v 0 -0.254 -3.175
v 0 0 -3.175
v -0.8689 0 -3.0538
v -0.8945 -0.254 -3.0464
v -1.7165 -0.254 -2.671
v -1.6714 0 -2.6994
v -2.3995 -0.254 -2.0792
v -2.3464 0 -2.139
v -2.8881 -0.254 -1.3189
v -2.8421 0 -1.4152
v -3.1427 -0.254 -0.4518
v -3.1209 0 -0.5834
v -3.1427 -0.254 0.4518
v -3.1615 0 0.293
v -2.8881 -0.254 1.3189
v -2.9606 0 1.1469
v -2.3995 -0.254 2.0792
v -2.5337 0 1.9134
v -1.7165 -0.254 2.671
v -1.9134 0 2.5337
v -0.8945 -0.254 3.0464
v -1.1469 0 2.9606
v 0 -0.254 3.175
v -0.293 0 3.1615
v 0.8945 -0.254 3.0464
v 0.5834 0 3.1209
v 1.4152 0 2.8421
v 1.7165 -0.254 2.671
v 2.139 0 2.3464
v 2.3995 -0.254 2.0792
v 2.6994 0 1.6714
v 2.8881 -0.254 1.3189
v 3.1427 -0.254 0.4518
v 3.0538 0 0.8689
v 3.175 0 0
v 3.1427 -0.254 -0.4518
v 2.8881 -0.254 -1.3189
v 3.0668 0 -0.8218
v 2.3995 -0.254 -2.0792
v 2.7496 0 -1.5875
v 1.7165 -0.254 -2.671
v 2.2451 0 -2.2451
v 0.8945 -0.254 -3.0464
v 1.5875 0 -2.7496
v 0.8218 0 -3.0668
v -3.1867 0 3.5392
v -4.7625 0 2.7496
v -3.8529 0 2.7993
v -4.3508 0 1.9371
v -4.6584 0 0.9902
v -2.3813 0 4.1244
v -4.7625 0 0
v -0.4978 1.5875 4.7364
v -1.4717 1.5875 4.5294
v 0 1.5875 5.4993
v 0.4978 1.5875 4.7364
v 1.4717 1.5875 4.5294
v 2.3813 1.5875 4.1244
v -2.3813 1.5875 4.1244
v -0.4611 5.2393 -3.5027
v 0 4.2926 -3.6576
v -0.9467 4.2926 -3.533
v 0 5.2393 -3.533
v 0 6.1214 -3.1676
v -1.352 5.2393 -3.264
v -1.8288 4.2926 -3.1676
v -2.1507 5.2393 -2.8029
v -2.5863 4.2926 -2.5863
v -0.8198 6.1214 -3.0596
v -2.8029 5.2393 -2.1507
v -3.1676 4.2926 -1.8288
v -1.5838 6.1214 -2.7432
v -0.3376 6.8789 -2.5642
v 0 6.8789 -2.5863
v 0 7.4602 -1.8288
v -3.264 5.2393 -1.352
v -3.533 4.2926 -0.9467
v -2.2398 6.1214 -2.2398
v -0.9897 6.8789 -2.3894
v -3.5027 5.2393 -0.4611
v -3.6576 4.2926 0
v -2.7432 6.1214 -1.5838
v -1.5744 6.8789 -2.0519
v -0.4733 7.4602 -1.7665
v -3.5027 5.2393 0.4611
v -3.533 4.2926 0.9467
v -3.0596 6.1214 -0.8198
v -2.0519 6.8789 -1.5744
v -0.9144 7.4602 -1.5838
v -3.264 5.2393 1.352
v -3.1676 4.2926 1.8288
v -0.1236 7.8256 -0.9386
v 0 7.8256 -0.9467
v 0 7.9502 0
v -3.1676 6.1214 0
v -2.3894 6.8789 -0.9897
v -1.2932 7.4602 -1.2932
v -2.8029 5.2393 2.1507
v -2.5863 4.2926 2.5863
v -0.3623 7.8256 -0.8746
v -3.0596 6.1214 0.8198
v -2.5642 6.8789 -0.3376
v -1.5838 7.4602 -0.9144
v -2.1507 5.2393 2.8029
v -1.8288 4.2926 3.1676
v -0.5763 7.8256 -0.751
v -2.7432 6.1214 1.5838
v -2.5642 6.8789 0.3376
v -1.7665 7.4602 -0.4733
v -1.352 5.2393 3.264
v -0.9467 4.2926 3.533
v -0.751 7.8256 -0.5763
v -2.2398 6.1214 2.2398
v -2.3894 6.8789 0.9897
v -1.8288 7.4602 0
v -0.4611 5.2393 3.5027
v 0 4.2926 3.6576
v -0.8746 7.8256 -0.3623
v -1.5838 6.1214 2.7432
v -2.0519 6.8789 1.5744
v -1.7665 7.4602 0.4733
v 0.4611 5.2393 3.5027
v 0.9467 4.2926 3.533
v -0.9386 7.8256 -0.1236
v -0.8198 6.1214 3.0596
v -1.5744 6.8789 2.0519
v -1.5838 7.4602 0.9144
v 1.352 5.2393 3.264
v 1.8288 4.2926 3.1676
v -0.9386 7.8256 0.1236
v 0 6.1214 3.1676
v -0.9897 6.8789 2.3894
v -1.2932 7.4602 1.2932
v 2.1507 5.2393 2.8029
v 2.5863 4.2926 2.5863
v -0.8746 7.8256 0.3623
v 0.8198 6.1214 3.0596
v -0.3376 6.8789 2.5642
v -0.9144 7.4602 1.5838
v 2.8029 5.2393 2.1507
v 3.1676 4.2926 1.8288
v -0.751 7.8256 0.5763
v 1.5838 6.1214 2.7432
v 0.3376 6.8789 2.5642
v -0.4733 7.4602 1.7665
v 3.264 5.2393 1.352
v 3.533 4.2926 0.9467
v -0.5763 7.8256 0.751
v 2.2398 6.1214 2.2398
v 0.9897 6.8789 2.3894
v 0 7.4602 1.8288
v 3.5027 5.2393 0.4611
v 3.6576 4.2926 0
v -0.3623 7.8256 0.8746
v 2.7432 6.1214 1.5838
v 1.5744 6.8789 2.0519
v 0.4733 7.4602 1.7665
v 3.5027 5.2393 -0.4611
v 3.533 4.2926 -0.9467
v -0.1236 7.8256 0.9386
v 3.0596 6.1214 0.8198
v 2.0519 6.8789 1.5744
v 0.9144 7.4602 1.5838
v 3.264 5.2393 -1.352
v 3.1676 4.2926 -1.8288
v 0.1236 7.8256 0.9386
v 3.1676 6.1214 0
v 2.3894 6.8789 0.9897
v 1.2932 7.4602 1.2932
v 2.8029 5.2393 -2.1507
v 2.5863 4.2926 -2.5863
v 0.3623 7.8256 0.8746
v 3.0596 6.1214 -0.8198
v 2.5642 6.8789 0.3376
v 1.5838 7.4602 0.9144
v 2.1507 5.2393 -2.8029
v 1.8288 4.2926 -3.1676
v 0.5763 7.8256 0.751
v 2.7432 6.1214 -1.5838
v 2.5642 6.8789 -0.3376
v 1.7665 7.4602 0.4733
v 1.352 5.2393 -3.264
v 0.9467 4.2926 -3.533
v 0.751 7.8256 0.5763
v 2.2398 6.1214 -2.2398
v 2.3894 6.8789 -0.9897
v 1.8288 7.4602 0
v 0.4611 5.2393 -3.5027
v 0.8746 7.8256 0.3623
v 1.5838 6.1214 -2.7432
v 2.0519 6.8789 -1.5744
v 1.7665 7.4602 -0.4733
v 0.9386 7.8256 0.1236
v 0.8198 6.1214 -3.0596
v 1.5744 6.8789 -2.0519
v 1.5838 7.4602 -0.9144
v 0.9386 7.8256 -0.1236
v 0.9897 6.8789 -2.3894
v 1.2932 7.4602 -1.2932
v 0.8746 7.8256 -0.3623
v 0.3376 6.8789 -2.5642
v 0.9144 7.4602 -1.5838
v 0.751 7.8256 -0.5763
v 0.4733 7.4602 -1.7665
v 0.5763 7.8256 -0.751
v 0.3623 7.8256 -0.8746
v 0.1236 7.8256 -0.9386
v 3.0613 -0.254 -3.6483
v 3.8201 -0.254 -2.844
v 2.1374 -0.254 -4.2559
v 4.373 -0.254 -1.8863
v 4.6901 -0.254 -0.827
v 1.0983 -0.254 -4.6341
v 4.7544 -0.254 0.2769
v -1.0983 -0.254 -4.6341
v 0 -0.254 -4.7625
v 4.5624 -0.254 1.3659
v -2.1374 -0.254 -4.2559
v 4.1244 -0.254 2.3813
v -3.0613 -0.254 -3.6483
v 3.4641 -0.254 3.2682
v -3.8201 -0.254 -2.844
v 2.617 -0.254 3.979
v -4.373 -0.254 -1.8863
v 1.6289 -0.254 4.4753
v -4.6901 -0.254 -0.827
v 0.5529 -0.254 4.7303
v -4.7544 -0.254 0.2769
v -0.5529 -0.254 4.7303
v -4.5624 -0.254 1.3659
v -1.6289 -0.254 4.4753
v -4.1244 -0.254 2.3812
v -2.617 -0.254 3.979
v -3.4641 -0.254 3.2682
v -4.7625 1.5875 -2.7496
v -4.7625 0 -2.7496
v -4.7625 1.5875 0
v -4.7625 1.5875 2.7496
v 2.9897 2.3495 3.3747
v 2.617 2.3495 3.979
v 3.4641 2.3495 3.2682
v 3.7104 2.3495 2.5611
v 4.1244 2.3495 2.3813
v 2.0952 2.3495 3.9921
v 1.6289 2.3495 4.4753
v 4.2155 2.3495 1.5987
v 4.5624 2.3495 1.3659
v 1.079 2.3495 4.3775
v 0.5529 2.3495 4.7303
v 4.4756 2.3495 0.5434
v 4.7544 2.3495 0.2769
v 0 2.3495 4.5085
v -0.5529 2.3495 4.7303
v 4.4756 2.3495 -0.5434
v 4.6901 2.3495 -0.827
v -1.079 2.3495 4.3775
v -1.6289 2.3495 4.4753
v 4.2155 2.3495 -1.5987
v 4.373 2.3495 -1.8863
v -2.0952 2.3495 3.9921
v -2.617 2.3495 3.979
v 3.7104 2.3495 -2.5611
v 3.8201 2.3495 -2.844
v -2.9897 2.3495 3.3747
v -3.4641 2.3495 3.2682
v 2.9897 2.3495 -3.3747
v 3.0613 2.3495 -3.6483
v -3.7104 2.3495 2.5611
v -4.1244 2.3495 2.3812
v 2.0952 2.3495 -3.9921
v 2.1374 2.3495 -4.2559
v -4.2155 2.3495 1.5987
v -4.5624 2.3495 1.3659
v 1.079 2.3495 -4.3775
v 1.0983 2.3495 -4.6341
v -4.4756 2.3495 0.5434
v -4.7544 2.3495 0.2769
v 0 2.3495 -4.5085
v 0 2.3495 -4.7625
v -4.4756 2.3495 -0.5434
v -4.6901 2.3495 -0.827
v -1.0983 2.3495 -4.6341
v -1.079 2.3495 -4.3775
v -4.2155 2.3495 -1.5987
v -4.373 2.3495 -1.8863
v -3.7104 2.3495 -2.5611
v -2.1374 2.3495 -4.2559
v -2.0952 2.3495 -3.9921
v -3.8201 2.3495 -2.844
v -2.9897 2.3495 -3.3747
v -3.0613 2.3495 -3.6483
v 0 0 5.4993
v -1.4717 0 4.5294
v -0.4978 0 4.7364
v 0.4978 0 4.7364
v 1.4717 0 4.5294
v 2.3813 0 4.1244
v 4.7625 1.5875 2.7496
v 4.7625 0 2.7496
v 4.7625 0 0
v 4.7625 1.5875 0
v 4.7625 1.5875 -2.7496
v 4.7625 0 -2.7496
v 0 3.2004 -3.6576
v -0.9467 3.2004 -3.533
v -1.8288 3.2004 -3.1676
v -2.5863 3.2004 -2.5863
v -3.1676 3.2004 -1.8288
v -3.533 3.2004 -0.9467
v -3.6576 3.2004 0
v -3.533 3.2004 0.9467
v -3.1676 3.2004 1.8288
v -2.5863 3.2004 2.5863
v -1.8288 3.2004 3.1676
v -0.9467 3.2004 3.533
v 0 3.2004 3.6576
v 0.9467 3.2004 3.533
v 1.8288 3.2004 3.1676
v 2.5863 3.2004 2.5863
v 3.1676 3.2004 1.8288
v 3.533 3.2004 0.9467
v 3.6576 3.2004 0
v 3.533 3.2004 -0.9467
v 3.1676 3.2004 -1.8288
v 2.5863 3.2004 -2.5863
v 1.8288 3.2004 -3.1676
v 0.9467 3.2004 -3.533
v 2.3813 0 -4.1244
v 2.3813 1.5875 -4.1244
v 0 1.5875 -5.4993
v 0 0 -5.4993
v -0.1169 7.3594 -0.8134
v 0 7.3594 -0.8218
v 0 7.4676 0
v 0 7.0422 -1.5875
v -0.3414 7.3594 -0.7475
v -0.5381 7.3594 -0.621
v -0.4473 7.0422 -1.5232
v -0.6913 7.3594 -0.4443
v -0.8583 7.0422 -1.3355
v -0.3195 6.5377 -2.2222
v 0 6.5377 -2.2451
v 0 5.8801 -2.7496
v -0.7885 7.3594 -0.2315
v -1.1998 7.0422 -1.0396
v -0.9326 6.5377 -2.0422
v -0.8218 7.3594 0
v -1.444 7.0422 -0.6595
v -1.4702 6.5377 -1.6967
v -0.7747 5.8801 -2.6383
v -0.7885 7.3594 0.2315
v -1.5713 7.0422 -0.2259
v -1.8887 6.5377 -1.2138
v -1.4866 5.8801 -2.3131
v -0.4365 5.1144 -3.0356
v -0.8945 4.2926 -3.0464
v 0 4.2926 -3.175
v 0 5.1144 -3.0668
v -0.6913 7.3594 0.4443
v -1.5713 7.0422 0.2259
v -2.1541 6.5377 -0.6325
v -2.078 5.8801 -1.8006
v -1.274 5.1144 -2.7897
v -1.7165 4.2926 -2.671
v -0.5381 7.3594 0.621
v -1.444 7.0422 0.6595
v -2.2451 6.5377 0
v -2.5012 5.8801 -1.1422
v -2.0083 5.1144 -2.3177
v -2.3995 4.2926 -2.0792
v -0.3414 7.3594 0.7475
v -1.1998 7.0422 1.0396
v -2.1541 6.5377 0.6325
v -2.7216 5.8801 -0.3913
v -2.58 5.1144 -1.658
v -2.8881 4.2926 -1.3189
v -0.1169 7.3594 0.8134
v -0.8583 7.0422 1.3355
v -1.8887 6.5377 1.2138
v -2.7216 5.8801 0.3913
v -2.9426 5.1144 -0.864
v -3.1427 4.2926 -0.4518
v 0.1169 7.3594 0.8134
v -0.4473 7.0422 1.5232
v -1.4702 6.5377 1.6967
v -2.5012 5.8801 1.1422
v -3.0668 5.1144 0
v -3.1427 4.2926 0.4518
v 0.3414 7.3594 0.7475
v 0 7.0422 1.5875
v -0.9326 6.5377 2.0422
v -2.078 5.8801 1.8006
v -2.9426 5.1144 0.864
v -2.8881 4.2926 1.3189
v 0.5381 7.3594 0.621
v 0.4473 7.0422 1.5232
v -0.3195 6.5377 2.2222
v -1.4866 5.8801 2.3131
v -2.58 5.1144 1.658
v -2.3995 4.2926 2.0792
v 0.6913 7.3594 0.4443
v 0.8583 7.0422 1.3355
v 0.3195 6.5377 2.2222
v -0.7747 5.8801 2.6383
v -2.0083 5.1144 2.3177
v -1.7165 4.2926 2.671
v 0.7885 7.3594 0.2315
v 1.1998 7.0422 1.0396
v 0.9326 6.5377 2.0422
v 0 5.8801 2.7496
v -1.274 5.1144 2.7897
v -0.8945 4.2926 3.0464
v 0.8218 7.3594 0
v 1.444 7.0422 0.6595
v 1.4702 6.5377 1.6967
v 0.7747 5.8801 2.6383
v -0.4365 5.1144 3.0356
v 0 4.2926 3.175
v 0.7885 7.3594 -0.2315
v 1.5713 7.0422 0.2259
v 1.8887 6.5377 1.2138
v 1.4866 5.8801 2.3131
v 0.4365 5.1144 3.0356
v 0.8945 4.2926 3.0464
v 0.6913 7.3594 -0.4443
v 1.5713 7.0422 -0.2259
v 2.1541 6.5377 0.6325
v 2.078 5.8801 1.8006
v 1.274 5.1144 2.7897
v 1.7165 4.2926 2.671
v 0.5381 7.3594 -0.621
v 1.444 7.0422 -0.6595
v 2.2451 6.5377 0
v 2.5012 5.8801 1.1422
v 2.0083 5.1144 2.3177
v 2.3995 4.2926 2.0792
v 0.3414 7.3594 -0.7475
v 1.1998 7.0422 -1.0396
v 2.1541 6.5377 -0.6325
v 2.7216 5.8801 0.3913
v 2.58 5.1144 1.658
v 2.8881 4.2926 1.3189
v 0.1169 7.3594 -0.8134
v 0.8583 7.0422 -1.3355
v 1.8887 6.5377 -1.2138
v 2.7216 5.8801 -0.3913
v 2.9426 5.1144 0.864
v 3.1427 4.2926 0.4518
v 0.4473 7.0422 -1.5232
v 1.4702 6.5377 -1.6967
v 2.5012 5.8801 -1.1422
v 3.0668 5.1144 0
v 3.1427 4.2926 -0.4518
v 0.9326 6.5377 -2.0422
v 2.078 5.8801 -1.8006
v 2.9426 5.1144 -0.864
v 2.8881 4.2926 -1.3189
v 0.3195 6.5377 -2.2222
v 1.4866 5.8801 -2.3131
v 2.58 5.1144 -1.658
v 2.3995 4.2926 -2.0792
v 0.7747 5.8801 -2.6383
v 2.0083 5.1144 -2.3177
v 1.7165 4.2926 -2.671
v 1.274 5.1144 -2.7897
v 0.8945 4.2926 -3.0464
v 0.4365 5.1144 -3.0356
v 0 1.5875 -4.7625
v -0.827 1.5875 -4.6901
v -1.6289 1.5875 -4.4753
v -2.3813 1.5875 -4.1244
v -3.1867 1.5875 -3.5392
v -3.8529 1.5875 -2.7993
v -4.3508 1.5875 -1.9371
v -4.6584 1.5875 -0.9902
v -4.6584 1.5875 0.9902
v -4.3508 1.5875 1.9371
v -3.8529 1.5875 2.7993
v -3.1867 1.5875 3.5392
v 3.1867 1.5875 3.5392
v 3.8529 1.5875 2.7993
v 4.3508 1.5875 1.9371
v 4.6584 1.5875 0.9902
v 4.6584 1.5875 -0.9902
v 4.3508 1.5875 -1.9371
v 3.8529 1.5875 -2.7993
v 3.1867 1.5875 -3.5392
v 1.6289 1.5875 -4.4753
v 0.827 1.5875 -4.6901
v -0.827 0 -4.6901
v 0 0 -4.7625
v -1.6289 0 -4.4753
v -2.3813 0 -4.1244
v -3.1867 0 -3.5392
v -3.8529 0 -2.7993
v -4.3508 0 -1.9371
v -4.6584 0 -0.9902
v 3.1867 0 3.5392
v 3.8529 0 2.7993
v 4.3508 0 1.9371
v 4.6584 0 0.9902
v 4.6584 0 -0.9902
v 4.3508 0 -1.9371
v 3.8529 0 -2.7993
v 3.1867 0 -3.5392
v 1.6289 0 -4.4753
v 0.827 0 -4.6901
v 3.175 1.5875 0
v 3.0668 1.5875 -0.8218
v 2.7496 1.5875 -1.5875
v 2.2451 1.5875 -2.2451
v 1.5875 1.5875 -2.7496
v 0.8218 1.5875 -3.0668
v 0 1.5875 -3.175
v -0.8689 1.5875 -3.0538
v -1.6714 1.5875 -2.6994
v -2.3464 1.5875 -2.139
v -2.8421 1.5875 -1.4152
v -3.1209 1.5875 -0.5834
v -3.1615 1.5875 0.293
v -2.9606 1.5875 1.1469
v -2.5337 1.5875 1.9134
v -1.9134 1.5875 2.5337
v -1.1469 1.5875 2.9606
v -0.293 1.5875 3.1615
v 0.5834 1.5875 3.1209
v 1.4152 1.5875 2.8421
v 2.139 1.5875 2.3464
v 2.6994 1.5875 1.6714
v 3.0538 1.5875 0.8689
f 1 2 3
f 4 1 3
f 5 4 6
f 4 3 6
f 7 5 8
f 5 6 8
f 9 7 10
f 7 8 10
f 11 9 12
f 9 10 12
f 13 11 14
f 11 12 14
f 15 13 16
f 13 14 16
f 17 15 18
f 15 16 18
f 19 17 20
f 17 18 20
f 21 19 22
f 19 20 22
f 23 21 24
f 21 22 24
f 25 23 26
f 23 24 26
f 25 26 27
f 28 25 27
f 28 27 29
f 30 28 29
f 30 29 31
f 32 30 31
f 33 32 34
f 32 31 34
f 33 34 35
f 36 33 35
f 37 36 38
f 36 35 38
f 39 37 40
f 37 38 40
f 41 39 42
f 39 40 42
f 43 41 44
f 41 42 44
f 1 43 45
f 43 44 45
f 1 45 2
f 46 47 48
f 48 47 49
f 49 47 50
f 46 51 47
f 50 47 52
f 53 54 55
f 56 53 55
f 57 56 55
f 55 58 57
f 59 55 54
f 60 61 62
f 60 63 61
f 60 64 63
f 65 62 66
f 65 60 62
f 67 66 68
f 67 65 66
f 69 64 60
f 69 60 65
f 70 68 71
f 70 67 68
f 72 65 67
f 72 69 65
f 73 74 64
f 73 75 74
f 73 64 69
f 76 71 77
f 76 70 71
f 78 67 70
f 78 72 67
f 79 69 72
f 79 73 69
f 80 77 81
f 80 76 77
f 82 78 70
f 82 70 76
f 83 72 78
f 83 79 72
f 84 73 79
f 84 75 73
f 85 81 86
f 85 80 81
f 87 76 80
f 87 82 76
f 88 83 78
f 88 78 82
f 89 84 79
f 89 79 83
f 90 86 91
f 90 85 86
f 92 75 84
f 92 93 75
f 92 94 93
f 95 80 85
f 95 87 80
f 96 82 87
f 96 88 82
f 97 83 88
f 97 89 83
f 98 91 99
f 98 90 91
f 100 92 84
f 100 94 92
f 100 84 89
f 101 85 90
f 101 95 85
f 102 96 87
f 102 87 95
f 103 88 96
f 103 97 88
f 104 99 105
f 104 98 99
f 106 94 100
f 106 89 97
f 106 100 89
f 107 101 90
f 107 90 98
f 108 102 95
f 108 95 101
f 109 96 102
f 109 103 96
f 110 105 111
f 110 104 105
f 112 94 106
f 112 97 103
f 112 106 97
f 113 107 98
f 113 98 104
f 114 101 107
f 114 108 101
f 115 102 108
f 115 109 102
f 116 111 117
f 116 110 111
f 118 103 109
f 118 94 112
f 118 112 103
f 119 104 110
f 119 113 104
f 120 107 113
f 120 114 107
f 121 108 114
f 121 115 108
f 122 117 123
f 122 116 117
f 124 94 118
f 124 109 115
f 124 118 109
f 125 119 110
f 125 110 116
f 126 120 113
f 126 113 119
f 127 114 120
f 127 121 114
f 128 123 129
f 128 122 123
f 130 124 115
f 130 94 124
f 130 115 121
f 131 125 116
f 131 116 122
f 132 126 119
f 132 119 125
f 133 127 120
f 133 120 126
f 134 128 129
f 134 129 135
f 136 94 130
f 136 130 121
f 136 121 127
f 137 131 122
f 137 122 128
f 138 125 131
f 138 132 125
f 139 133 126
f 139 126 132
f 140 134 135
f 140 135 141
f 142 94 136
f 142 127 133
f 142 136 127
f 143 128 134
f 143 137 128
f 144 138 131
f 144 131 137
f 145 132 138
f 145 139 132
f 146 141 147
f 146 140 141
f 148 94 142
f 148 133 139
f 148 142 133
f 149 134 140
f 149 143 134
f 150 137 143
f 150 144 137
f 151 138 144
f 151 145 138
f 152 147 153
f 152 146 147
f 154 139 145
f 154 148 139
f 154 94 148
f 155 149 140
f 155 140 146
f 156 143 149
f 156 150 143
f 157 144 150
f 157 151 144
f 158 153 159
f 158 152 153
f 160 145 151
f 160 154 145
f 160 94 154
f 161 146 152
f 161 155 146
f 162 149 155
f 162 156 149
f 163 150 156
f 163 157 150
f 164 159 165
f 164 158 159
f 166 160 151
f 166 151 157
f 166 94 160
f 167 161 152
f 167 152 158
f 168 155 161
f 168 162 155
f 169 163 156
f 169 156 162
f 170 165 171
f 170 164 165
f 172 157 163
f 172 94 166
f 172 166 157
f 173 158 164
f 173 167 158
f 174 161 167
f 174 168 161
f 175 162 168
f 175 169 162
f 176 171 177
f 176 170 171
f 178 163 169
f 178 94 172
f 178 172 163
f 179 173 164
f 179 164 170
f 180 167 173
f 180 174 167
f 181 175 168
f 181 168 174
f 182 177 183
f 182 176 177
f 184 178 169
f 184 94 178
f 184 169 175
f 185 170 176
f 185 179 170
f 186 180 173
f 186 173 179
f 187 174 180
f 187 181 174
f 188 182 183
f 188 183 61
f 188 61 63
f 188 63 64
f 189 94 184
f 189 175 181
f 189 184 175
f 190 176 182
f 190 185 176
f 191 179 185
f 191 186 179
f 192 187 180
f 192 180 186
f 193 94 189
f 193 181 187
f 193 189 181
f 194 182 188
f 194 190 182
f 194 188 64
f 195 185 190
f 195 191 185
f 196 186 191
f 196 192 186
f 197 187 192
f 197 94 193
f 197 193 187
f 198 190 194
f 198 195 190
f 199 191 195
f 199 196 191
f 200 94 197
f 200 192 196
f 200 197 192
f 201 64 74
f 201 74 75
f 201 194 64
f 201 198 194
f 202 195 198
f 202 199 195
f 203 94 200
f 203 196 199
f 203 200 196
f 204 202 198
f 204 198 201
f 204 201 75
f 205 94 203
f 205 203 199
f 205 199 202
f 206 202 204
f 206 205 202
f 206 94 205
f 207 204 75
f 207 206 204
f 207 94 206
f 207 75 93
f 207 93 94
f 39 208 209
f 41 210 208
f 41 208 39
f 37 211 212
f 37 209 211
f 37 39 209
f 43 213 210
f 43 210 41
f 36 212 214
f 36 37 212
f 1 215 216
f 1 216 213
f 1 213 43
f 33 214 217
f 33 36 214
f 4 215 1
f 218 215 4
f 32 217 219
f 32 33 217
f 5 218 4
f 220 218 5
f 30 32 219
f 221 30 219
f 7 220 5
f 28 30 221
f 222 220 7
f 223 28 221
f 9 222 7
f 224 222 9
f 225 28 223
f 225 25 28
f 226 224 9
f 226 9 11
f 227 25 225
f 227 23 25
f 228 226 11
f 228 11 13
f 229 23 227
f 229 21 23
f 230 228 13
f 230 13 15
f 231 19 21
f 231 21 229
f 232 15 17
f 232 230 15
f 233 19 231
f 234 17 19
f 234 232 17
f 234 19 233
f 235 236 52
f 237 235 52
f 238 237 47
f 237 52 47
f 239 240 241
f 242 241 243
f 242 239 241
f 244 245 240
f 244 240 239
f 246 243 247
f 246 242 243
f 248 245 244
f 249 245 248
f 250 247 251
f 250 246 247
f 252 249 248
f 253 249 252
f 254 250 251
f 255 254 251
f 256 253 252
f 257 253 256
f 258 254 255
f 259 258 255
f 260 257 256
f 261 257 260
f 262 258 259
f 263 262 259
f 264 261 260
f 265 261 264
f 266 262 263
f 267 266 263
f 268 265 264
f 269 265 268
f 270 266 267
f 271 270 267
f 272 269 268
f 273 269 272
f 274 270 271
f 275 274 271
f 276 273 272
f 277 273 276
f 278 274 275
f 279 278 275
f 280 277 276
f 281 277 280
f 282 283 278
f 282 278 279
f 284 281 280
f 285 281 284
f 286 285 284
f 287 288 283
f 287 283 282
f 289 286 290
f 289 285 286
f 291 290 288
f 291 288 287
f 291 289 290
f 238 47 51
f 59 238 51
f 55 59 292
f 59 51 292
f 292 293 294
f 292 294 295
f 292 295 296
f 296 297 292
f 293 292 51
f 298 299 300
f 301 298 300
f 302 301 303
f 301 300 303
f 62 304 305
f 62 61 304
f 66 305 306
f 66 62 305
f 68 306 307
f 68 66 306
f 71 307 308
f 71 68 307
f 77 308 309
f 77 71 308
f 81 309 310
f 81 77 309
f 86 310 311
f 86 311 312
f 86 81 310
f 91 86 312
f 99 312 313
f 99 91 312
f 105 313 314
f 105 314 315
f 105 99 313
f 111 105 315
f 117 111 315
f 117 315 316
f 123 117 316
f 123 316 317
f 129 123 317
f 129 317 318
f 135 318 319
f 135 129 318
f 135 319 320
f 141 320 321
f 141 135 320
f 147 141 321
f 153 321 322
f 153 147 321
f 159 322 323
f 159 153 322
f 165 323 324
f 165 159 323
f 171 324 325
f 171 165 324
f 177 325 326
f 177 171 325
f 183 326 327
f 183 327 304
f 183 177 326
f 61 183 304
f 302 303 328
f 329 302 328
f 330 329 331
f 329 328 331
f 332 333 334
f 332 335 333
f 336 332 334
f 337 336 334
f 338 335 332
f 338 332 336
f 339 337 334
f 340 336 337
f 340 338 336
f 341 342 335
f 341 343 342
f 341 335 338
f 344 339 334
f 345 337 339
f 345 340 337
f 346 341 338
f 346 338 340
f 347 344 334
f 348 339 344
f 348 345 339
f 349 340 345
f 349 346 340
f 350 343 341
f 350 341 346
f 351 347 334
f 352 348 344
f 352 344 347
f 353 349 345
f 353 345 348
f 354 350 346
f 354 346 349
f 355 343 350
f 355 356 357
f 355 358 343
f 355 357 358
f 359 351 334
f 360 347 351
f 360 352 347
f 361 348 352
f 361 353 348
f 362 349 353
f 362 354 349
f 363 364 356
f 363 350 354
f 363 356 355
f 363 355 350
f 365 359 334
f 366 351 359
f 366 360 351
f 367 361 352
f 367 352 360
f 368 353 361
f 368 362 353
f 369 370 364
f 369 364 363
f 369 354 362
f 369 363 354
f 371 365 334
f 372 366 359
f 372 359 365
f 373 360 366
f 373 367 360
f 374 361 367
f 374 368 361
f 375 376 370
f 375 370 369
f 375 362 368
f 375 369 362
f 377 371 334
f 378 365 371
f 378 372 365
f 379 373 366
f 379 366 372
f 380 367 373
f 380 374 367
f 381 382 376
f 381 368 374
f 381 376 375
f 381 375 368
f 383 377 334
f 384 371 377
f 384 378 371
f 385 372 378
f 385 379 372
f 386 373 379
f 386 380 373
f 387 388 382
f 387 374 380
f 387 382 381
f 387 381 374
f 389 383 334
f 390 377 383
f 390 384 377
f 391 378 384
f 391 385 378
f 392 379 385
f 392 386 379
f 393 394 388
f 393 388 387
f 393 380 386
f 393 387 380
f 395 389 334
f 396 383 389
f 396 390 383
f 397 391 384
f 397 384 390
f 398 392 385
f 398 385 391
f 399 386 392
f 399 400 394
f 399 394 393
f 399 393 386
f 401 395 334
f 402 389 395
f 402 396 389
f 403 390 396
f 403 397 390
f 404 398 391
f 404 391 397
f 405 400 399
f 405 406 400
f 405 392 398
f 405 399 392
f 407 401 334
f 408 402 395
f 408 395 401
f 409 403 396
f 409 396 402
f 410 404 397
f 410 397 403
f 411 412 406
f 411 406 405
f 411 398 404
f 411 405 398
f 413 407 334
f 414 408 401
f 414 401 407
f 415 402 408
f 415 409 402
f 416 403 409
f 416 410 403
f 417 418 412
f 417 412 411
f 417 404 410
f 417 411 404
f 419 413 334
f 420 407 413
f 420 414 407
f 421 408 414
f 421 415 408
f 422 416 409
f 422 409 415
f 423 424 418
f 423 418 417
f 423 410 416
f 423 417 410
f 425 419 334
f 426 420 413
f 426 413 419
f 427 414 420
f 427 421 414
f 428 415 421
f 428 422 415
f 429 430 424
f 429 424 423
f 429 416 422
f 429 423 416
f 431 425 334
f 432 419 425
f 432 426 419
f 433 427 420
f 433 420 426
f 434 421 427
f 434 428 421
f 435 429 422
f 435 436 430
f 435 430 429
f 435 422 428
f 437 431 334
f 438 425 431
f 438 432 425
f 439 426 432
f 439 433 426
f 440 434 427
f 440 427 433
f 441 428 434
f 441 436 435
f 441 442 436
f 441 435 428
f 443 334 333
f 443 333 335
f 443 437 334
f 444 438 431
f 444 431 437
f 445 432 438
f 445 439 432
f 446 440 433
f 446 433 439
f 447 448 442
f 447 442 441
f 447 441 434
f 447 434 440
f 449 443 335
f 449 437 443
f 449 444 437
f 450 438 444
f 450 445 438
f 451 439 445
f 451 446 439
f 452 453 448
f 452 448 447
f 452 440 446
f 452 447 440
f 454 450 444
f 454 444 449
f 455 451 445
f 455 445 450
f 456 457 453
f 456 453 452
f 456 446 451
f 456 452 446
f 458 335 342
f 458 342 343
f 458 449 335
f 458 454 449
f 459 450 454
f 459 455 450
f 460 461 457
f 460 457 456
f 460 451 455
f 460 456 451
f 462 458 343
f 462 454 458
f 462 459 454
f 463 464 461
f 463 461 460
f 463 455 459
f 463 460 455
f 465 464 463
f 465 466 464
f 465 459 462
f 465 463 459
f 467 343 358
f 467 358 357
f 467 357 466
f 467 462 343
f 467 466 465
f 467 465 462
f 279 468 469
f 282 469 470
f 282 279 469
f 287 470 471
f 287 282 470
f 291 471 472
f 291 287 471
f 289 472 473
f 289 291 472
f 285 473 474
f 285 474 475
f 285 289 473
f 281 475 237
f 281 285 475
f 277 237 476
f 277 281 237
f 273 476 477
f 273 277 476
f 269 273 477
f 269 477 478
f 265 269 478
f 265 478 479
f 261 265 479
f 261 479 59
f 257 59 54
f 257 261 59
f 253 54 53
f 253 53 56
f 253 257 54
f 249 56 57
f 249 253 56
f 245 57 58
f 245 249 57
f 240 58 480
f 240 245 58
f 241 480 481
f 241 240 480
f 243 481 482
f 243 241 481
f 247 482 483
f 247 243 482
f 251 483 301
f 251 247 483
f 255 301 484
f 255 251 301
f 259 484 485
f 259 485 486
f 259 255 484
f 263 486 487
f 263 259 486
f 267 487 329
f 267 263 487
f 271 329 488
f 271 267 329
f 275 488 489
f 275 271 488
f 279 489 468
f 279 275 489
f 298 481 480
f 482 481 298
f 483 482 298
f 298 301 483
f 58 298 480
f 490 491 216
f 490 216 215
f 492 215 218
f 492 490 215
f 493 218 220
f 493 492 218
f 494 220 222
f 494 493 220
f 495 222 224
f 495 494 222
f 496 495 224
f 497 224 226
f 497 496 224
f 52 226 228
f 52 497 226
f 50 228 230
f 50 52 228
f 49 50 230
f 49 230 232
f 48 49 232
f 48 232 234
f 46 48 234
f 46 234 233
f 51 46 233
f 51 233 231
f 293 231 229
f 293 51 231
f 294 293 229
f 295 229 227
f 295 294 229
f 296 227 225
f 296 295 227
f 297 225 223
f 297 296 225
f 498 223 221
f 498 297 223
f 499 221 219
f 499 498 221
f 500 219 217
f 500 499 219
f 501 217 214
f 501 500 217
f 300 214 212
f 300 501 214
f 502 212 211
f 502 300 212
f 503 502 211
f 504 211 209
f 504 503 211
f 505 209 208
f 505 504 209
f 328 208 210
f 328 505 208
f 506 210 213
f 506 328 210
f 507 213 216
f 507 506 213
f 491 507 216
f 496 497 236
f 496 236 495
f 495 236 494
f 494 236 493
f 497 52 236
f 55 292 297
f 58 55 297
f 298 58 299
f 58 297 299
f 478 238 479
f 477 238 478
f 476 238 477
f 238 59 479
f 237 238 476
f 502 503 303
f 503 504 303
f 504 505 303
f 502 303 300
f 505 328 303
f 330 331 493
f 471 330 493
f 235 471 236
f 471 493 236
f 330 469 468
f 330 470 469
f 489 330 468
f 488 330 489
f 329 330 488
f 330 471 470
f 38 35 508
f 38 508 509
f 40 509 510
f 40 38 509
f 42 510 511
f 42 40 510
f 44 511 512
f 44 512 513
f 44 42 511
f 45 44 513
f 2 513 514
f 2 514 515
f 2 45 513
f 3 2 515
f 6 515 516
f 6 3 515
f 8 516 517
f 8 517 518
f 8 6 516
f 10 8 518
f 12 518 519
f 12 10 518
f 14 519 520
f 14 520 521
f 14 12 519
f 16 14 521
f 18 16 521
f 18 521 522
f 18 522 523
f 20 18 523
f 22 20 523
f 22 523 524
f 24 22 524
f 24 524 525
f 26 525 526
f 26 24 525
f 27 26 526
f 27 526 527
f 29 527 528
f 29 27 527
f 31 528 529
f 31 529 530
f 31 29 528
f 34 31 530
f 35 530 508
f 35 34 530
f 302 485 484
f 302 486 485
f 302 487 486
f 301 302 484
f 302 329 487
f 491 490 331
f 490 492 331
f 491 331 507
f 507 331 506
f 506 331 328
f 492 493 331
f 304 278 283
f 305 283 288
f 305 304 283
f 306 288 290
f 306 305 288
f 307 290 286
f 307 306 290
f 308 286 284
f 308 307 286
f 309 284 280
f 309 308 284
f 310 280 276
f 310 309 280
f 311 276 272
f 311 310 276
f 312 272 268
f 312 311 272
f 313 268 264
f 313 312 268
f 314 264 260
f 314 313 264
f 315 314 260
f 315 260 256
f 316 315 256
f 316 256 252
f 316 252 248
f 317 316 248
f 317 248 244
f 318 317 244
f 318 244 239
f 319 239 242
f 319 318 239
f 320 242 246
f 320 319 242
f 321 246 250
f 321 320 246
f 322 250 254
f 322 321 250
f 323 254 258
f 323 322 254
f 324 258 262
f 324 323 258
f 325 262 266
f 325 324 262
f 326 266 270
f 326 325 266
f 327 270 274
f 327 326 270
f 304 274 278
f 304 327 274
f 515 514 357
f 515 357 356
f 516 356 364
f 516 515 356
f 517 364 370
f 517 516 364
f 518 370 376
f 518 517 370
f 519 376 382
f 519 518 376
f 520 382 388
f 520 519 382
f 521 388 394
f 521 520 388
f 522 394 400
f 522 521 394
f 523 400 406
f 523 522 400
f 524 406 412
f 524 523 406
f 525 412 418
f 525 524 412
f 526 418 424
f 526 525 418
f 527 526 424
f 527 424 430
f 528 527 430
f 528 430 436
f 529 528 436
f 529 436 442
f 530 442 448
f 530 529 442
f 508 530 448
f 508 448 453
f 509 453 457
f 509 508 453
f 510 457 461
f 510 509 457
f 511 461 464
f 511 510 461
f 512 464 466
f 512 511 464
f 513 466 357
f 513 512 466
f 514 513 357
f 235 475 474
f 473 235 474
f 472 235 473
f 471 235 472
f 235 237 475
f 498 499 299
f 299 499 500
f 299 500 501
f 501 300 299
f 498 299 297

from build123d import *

# Parameters (mm, degrees)
SKETCH1_R           = 3.175
BOSS_EXTRUDE1_DEPTH = 1.5875
SKETCH2_W           = 1.5875
SKETCH2_H           = 0.254


with BuildPart() as part:
    # Sketch1 → Boss-Extrude1 (new body)
    with BuildSketch(Plane(origin=(0, 0, 0), x_dir=(1, 0, 0), z_dir=(0, 1, 0))):
        Polygon((4.7625, 2.749630657), (0, 5.499261314), (-4.7625, 2.749630657), (-4.7625, -2.749630657), (0, -5.499261314), (4.7625, -2.749630657), align=None)
        Circle(SKETCH1_R, mode=Mode.SUBTRACT)
    extrude(amount=BOSS_EXTRUDE1_DEPTH)

    # Sketch2 → Revolve1 (revolve)
    with BuildSketch(Plane(origin=(0, 0, 0), x_dir=(0, 0, -1), z_dir=(1, 0, 0))):
        with BuildLine():
            Line((3.6576, 3.2004), (3.6576, 4.2926))
            ThreePointArc((3.6576, 4.2926), (2.586313763, 6.878913763), (0, 7.9502))
            Line((0, 7.9502), (0, 7.4676))
            ThreePointArc((0, 7.4676), (2.24506403, 6.53766403), (3.175, 4.2926))
            Line((3.175, 4.2926), (3.175, 1.5875))
            Line((3.175, 1.5875), (4.7625, 1.5875))
            Line((4.7625, 1.5875), (4.7625, 2.3495))
            Line((4.7625, 2.3495), (4.5085, 2.3495))
            Line((4.5085, 2.3495), (3.6576, 3.2004))
        make_face()
        with Locations((3.96875, -0.127)):
            Rectangle(SKETCH2_W, SKETCH2_H)
    revolve(axis=Axis((0, 0, 0), (0, 1, 0)))


solid = part.part
